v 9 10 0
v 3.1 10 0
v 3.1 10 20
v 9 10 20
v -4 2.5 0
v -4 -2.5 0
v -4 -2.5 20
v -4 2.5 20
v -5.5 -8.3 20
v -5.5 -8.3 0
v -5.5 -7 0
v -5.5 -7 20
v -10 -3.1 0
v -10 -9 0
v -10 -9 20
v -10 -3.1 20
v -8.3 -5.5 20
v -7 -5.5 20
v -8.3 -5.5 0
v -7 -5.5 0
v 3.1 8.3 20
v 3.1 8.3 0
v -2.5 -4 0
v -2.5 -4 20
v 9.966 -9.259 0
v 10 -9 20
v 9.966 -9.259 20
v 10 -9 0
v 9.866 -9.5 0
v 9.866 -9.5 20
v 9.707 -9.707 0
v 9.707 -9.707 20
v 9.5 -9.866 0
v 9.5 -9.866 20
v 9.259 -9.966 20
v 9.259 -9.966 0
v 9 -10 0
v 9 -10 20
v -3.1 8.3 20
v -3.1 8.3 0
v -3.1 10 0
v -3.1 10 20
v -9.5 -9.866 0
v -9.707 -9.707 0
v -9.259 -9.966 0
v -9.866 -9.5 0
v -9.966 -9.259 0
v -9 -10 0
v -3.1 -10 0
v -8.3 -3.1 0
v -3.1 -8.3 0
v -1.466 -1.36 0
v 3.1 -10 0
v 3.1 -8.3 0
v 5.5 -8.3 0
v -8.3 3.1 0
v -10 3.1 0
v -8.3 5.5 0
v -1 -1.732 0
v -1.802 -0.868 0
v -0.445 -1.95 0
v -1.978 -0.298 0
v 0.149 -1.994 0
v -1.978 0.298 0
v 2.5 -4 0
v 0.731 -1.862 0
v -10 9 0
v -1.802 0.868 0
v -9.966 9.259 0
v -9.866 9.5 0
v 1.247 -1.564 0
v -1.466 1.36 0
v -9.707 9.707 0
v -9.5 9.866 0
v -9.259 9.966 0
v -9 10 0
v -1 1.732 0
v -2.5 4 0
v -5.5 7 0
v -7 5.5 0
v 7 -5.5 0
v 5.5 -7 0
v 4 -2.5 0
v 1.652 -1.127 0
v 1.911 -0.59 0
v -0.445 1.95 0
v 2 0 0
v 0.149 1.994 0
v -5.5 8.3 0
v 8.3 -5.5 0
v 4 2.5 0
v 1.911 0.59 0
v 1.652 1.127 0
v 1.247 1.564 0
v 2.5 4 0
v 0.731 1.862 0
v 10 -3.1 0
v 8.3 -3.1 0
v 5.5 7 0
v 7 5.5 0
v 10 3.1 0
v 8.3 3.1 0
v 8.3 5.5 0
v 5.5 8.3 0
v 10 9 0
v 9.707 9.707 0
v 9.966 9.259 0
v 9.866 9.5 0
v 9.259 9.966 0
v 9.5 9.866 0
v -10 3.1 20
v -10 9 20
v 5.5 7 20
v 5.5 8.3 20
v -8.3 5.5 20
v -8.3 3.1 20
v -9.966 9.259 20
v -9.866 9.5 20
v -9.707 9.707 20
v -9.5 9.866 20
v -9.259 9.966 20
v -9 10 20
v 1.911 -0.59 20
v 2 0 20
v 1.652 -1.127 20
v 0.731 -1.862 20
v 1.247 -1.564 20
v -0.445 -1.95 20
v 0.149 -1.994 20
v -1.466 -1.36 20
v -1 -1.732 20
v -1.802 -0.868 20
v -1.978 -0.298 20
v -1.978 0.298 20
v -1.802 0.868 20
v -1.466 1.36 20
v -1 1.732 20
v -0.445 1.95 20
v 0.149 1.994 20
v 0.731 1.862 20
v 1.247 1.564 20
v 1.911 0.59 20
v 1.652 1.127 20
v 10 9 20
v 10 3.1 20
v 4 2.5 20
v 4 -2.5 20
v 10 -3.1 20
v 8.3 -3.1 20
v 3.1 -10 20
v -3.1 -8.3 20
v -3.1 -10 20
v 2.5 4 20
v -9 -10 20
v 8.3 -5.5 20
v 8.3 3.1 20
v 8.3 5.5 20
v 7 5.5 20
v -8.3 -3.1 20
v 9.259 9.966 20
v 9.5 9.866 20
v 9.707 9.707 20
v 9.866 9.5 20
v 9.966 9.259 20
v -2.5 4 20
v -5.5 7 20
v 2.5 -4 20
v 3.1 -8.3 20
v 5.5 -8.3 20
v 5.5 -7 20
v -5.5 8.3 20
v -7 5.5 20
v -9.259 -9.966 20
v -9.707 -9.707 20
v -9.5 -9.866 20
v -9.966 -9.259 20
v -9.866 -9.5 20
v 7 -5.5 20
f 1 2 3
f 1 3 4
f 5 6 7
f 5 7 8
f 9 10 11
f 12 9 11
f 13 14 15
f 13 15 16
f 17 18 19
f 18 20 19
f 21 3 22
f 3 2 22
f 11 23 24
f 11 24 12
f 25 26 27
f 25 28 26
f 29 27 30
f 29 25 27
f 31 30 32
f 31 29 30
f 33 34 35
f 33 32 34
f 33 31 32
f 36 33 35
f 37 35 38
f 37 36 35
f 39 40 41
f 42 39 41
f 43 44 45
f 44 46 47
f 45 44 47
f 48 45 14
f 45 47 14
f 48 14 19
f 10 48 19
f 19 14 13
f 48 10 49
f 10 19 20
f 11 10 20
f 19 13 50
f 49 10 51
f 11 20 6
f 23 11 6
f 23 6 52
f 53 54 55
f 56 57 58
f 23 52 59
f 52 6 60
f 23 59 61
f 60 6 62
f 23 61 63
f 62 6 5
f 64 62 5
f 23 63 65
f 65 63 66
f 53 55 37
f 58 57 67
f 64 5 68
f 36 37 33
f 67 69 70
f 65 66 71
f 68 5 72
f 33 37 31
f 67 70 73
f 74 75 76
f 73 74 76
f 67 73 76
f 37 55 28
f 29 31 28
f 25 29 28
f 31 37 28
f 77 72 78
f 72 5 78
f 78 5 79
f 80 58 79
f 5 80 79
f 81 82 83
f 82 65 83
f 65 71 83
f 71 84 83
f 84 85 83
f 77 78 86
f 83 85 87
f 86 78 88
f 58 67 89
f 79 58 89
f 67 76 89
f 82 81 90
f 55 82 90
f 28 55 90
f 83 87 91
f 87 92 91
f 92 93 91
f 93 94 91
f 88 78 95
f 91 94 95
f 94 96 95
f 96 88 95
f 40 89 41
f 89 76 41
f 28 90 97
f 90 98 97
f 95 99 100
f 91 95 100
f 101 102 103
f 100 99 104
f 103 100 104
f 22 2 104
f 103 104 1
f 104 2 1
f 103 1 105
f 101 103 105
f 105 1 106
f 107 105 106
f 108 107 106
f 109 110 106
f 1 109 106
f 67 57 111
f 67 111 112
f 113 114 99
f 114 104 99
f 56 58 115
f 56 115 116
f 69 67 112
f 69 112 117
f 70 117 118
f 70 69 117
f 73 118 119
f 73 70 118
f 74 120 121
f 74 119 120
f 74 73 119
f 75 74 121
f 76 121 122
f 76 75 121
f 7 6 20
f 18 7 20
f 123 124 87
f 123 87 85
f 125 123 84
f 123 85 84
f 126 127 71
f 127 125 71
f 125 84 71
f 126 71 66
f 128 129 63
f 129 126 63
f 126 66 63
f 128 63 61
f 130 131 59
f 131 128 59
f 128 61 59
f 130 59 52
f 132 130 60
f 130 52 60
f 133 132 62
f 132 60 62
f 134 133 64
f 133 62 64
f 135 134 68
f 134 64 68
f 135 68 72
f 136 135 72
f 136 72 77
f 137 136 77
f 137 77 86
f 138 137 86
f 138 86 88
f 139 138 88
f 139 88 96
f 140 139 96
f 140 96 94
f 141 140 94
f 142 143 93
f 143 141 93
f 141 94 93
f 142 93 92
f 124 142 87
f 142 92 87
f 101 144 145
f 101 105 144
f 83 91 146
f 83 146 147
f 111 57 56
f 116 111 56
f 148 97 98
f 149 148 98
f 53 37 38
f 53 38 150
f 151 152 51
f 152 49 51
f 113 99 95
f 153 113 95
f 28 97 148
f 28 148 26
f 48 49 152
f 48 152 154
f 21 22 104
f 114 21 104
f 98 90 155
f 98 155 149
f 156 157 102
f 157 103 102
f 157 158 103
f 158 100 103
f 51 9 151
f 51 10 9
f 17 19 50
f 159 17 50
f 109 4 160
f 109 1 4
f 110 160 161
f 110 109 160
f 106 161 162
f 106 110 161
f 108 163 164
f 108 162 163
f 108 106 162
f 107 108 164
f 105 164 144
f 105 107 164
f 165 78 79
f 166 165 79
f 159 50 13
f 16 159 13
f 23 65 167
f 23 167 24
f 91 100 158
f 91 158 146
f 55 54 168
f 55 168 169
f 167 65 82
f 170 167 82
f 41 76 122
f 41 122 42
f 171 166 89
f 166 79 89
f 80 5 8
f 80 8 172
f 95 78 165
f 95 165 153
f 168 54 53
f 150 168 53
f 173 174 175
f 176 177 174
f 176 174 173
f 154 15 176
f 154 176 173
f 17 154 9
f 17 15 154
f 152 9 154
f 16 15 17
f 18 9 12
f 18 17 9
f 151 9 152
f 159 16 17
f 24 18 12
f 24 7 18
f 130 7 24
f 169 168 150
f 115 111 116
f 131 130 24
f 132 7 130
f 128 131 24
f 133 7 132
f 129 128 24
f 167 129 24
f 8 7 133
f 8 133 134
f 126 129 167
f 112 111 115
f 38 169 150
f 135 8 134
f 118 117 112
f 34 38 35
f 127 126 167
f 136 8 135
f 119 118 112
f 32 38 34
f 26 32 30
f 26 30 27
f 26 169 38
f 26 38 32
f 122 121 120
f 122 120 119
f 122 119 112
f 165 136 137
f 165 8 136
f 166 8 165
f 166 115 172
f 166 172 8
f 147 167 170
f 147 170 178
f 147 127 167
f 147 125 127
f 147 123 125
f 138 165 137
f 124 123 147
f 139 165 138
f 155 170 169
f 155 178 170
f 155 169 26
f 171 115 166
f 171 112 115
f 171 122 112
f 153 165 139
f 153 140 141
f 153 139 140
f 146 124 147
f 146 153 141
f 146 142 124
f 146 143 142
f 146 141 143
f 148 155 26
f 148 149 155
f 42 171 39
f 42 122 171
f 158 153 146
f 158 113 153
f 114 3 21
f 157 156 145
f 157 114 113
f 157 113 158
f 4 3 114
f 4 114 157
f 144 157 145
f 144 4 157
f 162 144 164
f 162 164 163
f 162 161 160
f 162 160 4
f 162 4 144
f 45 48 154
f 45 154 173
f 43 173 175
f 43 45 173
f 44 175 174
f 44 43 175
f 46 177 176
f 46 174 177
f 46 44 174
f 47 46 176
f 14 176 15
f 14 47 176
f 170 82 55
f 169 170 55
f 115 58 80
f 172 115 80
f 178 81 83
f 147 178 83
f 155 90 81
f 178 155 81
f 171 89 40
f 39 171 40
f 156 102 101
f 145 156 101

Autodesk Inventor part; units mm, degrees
ref_plane "YZ Plane" through (0, 0, 0) normal (1, 0, 0) x (0, 1, 0)
ref_plane "XZ Plane" through (0, 0, 0) normal (0, 1, 0) x (-1, 0, 0)
ref_plane "XY Plane" through (0, 0, 0) normal (0, 0, 1) x (1, 0, 0)
sketch "Sketch1" plane through (0, 0, 0) normal (0, 0, 1) x (1, 0, 0)
  line L0 (-9, 10) -> (9, 10)
  line L1 (10, 9) -> (10, -9)
  line L2 (9, -10) -> (-9, -10)
  line L3 (-10, -9) -> (-10, 9)
  line L4 (-10, 10) -> (10, -10) construction
  line L5 (10, 10) -> (-10, -10) construction
  circle A0 centre (0, 0) radius 2
  line L6 (-4, 4) -> (4, 4)
  line L7 (4, 4) -> (4, -4)
  line L8 (4, -4) -> (-4, -4)
  line L9 (-4, -4) -> (-4, 4)
  line L10 (-4, 4) -> (4, -4) construction
  line L11 (4, 4) -> (-4, -4) construction
  arc A1 (-9, 10) -> (-10, 9) centre (-9, 9) ccw
  arc A2 (10, 9) -> (9, 10) centre (9, 9) ccw
  arc A3 (9, -10) -> (10, -9) centre (9, -9) ccw
  arc A4 (-10, -9) -> (-9, -10) centre (-9, -9) ccw
  line L12 (-3.1, 10) -> (3.1, 10)
  line L13 (3.1, 10) -> (3.1, -10)
  line L14 (3.1, -10) -> (-3.1, -10)
  line L15 (-3.1, -10) -> (-3.1, 10)
  line L16 (-10, 3.1) -> (10, 3.1)
  line L17 (10, 3.1) -> (10, -3.1)
  line L18 (10, -3.1) -> (-10, -3.1)
  line L19 (-10, -3.1) -> (-10, 3.1)
  line L20 (-5.5, 10) -> (5.5, 10)
  line L21 (5.5, 10) -> (5.5, -10)
  line L22 (5.5, -10) -> (-5.5, -10)
  line L23 (-5.5, -10) -> (-5.5, 10)
  line L24 (-10, 5.5) -> (10, 5.5)
  line L25 (10, 5.5) -> (10, -5.5)
  line L26 (10, -5.5) -> (-10, -5.5)
  line L27 (-10, -5.5) -> (-10, 5.5)
  line L28 (-8.3, 5.5) -> (-8.3, 3.1)
  line L29 (-8.3, -5.5) -> (-8.3, -3.1)
  line L30 (8.3, -5.5) -> (8.3, -3.1)
  line L31 (8.3, 5.5) -> (8.3, 3.1)
  line L32 (-5.5, 8.3) -> (-3.1, 8.3)
  line L33 (3.1, 8.3) -> (5.5, 8.3)
  line L34 (-5.5, -8.3) -> (-3.1, -8.3)
  line L35 (3.1, -8.3) -> (5.5, -8.3)
  line L36 (-4, 2.5) -> (-7, 5.5)
  line L37 (-4, 2.5) -> (0.2426, 2.5) construction
  line L38 (-4, -2.5) -> (-7, -5.5)
  line L39 (-4, -2.5) -> (0.2426, -2.5) construction
  line L40 (-2.5, 4) -> (-5.5, 7)
  line L41 (-2.5, 4) -> (1.7426, 4) construction
  line L42 (5.5, 7) -> (2.5, 4)
  line L43 (5.5, 7) -> (9.7426, 7) construction
  line L44 (7, 5.5) -> (4, 2.5)
  line L45 (7, 5.5) -> (11.2426, 5.5) construction
  line L46 (7, -5.5) -> (4, -2.5)
  line L47 (7, -5.5) -> (11.2426, -5.5) construction
  line L48 (2.5, -4) -> (5.5, -7)
  line L49 (2.5, -4) -> (6.7426, -4) construction
  line L50 (-2.5, -4) -> (-5.5, -7)
  line L51 (-2.5, -4) -> (1.7426, -4) construction
  point P0 (3.1, -3.1)
  point P1 (3.1, -5.5)
  point P2 (5.5, -5.5)
  point P3 (10, 3.1)
  point P4 (-5.5, -5.5)
  point P5 (-3.1, -5.5)
  point P6 (-3.1, -3.1)
  dimension "d0" = 20
  dimension "d1" = 20
  dimension "d2" = 4
  dimension "d3" = 8
  dimension "d4" = 8
  dimension "d5" = 1
  dimension "d6" = 6.2
  dimension "d7" = 3.1
  dimension "d8" = 6.2
  dimension "d9" = 3.1
  dimension "d10" = 11
  dimension "d11" = 5.5
  dimension "d12" = 11
  dimension "d13" = 5.5
  dimension "d14" = 4.3
  dimension "d15" = 4.3
  dimension "d16" = 4.3
  dimension "d17" = 4.3
  dimension "d18" = 135
  dimension "d19" = 135
  dimension "d20" = 135
  dimension "d21" = 135
  dimension "d22" = 135
  dimension "d23" = 135
  dimension "d24" = 1.3
  dimension "d25" = 1.3
  dimension "d26" = 1.3
  dimension "d27" = 1.3
  dimension "d28" = 1.3
  dimension "d29" = 1.3
  dimension "d32" = 45
  dimension "d33" = 135
  dimension "d34" = 1.3
  dimension "d35" = 1.3
extrude "Extrusion1" add sketch "Sketch1" along normal blind 20 contours L0 L23 L24 L3 A1 | L0 L15 L32 L23 | L24 L28 L16 L3 | L0 L21 L33 L13 | L40 L24 L23 | L0 A2 L1 L24 L21 | L24 L40 L15 L6 L9 L16 L36 L23 | L23 L36 L24 | L18 L29 L26 L3 | L40 L6 L15 | L26 L23 L2 A4 L3 | L21 L24 L42 | L42 L24 L21 L44 L16 L7 L6 L13 | L13 L6 L42 | L15 L16 L9 L6 | L6 L13 L16 L15 | L16 L9 L36 | L1 L16 L31 L24 | L24 L44 L21 | L6 L7 L16 L13 | L16 L13 L18 L15 | L15 L18 L9 L16 | L38 L23 L26 | L38 L9 L18 | L18 L9 L8 L15 L50 L26 L23 L38 | L16 L7 L18 L13 | L18 L13 L8 L15 | L15 L8 L9 L18 | L23 L34 L15 L2 | L26 L50 L23 | L1 L26 L30 L18 | L44 L7 L16 | L18 L7 L8 L13 | L8 L50 L15 | L1 A3 L2 L21 L26 | L13 L48 L8 | L8 L7 L18 L46 L21 L26 L48 L13 | L7 L46 L18 | L13 L35 L21 L2 | L46 L26 L21 | L21 L48 L26
equation "\"d7\" = 0.5 * d6"
equation "\"d8\" = d6"
equation "\"d9\" = 0.5 * d6"
equation "\"d11\" = 0.5 * d10"
equation "\"d12\" = d10"
equation "\"d13\" = 0.5 * d12"
properties part number "Aluminum_Profile_202020"
